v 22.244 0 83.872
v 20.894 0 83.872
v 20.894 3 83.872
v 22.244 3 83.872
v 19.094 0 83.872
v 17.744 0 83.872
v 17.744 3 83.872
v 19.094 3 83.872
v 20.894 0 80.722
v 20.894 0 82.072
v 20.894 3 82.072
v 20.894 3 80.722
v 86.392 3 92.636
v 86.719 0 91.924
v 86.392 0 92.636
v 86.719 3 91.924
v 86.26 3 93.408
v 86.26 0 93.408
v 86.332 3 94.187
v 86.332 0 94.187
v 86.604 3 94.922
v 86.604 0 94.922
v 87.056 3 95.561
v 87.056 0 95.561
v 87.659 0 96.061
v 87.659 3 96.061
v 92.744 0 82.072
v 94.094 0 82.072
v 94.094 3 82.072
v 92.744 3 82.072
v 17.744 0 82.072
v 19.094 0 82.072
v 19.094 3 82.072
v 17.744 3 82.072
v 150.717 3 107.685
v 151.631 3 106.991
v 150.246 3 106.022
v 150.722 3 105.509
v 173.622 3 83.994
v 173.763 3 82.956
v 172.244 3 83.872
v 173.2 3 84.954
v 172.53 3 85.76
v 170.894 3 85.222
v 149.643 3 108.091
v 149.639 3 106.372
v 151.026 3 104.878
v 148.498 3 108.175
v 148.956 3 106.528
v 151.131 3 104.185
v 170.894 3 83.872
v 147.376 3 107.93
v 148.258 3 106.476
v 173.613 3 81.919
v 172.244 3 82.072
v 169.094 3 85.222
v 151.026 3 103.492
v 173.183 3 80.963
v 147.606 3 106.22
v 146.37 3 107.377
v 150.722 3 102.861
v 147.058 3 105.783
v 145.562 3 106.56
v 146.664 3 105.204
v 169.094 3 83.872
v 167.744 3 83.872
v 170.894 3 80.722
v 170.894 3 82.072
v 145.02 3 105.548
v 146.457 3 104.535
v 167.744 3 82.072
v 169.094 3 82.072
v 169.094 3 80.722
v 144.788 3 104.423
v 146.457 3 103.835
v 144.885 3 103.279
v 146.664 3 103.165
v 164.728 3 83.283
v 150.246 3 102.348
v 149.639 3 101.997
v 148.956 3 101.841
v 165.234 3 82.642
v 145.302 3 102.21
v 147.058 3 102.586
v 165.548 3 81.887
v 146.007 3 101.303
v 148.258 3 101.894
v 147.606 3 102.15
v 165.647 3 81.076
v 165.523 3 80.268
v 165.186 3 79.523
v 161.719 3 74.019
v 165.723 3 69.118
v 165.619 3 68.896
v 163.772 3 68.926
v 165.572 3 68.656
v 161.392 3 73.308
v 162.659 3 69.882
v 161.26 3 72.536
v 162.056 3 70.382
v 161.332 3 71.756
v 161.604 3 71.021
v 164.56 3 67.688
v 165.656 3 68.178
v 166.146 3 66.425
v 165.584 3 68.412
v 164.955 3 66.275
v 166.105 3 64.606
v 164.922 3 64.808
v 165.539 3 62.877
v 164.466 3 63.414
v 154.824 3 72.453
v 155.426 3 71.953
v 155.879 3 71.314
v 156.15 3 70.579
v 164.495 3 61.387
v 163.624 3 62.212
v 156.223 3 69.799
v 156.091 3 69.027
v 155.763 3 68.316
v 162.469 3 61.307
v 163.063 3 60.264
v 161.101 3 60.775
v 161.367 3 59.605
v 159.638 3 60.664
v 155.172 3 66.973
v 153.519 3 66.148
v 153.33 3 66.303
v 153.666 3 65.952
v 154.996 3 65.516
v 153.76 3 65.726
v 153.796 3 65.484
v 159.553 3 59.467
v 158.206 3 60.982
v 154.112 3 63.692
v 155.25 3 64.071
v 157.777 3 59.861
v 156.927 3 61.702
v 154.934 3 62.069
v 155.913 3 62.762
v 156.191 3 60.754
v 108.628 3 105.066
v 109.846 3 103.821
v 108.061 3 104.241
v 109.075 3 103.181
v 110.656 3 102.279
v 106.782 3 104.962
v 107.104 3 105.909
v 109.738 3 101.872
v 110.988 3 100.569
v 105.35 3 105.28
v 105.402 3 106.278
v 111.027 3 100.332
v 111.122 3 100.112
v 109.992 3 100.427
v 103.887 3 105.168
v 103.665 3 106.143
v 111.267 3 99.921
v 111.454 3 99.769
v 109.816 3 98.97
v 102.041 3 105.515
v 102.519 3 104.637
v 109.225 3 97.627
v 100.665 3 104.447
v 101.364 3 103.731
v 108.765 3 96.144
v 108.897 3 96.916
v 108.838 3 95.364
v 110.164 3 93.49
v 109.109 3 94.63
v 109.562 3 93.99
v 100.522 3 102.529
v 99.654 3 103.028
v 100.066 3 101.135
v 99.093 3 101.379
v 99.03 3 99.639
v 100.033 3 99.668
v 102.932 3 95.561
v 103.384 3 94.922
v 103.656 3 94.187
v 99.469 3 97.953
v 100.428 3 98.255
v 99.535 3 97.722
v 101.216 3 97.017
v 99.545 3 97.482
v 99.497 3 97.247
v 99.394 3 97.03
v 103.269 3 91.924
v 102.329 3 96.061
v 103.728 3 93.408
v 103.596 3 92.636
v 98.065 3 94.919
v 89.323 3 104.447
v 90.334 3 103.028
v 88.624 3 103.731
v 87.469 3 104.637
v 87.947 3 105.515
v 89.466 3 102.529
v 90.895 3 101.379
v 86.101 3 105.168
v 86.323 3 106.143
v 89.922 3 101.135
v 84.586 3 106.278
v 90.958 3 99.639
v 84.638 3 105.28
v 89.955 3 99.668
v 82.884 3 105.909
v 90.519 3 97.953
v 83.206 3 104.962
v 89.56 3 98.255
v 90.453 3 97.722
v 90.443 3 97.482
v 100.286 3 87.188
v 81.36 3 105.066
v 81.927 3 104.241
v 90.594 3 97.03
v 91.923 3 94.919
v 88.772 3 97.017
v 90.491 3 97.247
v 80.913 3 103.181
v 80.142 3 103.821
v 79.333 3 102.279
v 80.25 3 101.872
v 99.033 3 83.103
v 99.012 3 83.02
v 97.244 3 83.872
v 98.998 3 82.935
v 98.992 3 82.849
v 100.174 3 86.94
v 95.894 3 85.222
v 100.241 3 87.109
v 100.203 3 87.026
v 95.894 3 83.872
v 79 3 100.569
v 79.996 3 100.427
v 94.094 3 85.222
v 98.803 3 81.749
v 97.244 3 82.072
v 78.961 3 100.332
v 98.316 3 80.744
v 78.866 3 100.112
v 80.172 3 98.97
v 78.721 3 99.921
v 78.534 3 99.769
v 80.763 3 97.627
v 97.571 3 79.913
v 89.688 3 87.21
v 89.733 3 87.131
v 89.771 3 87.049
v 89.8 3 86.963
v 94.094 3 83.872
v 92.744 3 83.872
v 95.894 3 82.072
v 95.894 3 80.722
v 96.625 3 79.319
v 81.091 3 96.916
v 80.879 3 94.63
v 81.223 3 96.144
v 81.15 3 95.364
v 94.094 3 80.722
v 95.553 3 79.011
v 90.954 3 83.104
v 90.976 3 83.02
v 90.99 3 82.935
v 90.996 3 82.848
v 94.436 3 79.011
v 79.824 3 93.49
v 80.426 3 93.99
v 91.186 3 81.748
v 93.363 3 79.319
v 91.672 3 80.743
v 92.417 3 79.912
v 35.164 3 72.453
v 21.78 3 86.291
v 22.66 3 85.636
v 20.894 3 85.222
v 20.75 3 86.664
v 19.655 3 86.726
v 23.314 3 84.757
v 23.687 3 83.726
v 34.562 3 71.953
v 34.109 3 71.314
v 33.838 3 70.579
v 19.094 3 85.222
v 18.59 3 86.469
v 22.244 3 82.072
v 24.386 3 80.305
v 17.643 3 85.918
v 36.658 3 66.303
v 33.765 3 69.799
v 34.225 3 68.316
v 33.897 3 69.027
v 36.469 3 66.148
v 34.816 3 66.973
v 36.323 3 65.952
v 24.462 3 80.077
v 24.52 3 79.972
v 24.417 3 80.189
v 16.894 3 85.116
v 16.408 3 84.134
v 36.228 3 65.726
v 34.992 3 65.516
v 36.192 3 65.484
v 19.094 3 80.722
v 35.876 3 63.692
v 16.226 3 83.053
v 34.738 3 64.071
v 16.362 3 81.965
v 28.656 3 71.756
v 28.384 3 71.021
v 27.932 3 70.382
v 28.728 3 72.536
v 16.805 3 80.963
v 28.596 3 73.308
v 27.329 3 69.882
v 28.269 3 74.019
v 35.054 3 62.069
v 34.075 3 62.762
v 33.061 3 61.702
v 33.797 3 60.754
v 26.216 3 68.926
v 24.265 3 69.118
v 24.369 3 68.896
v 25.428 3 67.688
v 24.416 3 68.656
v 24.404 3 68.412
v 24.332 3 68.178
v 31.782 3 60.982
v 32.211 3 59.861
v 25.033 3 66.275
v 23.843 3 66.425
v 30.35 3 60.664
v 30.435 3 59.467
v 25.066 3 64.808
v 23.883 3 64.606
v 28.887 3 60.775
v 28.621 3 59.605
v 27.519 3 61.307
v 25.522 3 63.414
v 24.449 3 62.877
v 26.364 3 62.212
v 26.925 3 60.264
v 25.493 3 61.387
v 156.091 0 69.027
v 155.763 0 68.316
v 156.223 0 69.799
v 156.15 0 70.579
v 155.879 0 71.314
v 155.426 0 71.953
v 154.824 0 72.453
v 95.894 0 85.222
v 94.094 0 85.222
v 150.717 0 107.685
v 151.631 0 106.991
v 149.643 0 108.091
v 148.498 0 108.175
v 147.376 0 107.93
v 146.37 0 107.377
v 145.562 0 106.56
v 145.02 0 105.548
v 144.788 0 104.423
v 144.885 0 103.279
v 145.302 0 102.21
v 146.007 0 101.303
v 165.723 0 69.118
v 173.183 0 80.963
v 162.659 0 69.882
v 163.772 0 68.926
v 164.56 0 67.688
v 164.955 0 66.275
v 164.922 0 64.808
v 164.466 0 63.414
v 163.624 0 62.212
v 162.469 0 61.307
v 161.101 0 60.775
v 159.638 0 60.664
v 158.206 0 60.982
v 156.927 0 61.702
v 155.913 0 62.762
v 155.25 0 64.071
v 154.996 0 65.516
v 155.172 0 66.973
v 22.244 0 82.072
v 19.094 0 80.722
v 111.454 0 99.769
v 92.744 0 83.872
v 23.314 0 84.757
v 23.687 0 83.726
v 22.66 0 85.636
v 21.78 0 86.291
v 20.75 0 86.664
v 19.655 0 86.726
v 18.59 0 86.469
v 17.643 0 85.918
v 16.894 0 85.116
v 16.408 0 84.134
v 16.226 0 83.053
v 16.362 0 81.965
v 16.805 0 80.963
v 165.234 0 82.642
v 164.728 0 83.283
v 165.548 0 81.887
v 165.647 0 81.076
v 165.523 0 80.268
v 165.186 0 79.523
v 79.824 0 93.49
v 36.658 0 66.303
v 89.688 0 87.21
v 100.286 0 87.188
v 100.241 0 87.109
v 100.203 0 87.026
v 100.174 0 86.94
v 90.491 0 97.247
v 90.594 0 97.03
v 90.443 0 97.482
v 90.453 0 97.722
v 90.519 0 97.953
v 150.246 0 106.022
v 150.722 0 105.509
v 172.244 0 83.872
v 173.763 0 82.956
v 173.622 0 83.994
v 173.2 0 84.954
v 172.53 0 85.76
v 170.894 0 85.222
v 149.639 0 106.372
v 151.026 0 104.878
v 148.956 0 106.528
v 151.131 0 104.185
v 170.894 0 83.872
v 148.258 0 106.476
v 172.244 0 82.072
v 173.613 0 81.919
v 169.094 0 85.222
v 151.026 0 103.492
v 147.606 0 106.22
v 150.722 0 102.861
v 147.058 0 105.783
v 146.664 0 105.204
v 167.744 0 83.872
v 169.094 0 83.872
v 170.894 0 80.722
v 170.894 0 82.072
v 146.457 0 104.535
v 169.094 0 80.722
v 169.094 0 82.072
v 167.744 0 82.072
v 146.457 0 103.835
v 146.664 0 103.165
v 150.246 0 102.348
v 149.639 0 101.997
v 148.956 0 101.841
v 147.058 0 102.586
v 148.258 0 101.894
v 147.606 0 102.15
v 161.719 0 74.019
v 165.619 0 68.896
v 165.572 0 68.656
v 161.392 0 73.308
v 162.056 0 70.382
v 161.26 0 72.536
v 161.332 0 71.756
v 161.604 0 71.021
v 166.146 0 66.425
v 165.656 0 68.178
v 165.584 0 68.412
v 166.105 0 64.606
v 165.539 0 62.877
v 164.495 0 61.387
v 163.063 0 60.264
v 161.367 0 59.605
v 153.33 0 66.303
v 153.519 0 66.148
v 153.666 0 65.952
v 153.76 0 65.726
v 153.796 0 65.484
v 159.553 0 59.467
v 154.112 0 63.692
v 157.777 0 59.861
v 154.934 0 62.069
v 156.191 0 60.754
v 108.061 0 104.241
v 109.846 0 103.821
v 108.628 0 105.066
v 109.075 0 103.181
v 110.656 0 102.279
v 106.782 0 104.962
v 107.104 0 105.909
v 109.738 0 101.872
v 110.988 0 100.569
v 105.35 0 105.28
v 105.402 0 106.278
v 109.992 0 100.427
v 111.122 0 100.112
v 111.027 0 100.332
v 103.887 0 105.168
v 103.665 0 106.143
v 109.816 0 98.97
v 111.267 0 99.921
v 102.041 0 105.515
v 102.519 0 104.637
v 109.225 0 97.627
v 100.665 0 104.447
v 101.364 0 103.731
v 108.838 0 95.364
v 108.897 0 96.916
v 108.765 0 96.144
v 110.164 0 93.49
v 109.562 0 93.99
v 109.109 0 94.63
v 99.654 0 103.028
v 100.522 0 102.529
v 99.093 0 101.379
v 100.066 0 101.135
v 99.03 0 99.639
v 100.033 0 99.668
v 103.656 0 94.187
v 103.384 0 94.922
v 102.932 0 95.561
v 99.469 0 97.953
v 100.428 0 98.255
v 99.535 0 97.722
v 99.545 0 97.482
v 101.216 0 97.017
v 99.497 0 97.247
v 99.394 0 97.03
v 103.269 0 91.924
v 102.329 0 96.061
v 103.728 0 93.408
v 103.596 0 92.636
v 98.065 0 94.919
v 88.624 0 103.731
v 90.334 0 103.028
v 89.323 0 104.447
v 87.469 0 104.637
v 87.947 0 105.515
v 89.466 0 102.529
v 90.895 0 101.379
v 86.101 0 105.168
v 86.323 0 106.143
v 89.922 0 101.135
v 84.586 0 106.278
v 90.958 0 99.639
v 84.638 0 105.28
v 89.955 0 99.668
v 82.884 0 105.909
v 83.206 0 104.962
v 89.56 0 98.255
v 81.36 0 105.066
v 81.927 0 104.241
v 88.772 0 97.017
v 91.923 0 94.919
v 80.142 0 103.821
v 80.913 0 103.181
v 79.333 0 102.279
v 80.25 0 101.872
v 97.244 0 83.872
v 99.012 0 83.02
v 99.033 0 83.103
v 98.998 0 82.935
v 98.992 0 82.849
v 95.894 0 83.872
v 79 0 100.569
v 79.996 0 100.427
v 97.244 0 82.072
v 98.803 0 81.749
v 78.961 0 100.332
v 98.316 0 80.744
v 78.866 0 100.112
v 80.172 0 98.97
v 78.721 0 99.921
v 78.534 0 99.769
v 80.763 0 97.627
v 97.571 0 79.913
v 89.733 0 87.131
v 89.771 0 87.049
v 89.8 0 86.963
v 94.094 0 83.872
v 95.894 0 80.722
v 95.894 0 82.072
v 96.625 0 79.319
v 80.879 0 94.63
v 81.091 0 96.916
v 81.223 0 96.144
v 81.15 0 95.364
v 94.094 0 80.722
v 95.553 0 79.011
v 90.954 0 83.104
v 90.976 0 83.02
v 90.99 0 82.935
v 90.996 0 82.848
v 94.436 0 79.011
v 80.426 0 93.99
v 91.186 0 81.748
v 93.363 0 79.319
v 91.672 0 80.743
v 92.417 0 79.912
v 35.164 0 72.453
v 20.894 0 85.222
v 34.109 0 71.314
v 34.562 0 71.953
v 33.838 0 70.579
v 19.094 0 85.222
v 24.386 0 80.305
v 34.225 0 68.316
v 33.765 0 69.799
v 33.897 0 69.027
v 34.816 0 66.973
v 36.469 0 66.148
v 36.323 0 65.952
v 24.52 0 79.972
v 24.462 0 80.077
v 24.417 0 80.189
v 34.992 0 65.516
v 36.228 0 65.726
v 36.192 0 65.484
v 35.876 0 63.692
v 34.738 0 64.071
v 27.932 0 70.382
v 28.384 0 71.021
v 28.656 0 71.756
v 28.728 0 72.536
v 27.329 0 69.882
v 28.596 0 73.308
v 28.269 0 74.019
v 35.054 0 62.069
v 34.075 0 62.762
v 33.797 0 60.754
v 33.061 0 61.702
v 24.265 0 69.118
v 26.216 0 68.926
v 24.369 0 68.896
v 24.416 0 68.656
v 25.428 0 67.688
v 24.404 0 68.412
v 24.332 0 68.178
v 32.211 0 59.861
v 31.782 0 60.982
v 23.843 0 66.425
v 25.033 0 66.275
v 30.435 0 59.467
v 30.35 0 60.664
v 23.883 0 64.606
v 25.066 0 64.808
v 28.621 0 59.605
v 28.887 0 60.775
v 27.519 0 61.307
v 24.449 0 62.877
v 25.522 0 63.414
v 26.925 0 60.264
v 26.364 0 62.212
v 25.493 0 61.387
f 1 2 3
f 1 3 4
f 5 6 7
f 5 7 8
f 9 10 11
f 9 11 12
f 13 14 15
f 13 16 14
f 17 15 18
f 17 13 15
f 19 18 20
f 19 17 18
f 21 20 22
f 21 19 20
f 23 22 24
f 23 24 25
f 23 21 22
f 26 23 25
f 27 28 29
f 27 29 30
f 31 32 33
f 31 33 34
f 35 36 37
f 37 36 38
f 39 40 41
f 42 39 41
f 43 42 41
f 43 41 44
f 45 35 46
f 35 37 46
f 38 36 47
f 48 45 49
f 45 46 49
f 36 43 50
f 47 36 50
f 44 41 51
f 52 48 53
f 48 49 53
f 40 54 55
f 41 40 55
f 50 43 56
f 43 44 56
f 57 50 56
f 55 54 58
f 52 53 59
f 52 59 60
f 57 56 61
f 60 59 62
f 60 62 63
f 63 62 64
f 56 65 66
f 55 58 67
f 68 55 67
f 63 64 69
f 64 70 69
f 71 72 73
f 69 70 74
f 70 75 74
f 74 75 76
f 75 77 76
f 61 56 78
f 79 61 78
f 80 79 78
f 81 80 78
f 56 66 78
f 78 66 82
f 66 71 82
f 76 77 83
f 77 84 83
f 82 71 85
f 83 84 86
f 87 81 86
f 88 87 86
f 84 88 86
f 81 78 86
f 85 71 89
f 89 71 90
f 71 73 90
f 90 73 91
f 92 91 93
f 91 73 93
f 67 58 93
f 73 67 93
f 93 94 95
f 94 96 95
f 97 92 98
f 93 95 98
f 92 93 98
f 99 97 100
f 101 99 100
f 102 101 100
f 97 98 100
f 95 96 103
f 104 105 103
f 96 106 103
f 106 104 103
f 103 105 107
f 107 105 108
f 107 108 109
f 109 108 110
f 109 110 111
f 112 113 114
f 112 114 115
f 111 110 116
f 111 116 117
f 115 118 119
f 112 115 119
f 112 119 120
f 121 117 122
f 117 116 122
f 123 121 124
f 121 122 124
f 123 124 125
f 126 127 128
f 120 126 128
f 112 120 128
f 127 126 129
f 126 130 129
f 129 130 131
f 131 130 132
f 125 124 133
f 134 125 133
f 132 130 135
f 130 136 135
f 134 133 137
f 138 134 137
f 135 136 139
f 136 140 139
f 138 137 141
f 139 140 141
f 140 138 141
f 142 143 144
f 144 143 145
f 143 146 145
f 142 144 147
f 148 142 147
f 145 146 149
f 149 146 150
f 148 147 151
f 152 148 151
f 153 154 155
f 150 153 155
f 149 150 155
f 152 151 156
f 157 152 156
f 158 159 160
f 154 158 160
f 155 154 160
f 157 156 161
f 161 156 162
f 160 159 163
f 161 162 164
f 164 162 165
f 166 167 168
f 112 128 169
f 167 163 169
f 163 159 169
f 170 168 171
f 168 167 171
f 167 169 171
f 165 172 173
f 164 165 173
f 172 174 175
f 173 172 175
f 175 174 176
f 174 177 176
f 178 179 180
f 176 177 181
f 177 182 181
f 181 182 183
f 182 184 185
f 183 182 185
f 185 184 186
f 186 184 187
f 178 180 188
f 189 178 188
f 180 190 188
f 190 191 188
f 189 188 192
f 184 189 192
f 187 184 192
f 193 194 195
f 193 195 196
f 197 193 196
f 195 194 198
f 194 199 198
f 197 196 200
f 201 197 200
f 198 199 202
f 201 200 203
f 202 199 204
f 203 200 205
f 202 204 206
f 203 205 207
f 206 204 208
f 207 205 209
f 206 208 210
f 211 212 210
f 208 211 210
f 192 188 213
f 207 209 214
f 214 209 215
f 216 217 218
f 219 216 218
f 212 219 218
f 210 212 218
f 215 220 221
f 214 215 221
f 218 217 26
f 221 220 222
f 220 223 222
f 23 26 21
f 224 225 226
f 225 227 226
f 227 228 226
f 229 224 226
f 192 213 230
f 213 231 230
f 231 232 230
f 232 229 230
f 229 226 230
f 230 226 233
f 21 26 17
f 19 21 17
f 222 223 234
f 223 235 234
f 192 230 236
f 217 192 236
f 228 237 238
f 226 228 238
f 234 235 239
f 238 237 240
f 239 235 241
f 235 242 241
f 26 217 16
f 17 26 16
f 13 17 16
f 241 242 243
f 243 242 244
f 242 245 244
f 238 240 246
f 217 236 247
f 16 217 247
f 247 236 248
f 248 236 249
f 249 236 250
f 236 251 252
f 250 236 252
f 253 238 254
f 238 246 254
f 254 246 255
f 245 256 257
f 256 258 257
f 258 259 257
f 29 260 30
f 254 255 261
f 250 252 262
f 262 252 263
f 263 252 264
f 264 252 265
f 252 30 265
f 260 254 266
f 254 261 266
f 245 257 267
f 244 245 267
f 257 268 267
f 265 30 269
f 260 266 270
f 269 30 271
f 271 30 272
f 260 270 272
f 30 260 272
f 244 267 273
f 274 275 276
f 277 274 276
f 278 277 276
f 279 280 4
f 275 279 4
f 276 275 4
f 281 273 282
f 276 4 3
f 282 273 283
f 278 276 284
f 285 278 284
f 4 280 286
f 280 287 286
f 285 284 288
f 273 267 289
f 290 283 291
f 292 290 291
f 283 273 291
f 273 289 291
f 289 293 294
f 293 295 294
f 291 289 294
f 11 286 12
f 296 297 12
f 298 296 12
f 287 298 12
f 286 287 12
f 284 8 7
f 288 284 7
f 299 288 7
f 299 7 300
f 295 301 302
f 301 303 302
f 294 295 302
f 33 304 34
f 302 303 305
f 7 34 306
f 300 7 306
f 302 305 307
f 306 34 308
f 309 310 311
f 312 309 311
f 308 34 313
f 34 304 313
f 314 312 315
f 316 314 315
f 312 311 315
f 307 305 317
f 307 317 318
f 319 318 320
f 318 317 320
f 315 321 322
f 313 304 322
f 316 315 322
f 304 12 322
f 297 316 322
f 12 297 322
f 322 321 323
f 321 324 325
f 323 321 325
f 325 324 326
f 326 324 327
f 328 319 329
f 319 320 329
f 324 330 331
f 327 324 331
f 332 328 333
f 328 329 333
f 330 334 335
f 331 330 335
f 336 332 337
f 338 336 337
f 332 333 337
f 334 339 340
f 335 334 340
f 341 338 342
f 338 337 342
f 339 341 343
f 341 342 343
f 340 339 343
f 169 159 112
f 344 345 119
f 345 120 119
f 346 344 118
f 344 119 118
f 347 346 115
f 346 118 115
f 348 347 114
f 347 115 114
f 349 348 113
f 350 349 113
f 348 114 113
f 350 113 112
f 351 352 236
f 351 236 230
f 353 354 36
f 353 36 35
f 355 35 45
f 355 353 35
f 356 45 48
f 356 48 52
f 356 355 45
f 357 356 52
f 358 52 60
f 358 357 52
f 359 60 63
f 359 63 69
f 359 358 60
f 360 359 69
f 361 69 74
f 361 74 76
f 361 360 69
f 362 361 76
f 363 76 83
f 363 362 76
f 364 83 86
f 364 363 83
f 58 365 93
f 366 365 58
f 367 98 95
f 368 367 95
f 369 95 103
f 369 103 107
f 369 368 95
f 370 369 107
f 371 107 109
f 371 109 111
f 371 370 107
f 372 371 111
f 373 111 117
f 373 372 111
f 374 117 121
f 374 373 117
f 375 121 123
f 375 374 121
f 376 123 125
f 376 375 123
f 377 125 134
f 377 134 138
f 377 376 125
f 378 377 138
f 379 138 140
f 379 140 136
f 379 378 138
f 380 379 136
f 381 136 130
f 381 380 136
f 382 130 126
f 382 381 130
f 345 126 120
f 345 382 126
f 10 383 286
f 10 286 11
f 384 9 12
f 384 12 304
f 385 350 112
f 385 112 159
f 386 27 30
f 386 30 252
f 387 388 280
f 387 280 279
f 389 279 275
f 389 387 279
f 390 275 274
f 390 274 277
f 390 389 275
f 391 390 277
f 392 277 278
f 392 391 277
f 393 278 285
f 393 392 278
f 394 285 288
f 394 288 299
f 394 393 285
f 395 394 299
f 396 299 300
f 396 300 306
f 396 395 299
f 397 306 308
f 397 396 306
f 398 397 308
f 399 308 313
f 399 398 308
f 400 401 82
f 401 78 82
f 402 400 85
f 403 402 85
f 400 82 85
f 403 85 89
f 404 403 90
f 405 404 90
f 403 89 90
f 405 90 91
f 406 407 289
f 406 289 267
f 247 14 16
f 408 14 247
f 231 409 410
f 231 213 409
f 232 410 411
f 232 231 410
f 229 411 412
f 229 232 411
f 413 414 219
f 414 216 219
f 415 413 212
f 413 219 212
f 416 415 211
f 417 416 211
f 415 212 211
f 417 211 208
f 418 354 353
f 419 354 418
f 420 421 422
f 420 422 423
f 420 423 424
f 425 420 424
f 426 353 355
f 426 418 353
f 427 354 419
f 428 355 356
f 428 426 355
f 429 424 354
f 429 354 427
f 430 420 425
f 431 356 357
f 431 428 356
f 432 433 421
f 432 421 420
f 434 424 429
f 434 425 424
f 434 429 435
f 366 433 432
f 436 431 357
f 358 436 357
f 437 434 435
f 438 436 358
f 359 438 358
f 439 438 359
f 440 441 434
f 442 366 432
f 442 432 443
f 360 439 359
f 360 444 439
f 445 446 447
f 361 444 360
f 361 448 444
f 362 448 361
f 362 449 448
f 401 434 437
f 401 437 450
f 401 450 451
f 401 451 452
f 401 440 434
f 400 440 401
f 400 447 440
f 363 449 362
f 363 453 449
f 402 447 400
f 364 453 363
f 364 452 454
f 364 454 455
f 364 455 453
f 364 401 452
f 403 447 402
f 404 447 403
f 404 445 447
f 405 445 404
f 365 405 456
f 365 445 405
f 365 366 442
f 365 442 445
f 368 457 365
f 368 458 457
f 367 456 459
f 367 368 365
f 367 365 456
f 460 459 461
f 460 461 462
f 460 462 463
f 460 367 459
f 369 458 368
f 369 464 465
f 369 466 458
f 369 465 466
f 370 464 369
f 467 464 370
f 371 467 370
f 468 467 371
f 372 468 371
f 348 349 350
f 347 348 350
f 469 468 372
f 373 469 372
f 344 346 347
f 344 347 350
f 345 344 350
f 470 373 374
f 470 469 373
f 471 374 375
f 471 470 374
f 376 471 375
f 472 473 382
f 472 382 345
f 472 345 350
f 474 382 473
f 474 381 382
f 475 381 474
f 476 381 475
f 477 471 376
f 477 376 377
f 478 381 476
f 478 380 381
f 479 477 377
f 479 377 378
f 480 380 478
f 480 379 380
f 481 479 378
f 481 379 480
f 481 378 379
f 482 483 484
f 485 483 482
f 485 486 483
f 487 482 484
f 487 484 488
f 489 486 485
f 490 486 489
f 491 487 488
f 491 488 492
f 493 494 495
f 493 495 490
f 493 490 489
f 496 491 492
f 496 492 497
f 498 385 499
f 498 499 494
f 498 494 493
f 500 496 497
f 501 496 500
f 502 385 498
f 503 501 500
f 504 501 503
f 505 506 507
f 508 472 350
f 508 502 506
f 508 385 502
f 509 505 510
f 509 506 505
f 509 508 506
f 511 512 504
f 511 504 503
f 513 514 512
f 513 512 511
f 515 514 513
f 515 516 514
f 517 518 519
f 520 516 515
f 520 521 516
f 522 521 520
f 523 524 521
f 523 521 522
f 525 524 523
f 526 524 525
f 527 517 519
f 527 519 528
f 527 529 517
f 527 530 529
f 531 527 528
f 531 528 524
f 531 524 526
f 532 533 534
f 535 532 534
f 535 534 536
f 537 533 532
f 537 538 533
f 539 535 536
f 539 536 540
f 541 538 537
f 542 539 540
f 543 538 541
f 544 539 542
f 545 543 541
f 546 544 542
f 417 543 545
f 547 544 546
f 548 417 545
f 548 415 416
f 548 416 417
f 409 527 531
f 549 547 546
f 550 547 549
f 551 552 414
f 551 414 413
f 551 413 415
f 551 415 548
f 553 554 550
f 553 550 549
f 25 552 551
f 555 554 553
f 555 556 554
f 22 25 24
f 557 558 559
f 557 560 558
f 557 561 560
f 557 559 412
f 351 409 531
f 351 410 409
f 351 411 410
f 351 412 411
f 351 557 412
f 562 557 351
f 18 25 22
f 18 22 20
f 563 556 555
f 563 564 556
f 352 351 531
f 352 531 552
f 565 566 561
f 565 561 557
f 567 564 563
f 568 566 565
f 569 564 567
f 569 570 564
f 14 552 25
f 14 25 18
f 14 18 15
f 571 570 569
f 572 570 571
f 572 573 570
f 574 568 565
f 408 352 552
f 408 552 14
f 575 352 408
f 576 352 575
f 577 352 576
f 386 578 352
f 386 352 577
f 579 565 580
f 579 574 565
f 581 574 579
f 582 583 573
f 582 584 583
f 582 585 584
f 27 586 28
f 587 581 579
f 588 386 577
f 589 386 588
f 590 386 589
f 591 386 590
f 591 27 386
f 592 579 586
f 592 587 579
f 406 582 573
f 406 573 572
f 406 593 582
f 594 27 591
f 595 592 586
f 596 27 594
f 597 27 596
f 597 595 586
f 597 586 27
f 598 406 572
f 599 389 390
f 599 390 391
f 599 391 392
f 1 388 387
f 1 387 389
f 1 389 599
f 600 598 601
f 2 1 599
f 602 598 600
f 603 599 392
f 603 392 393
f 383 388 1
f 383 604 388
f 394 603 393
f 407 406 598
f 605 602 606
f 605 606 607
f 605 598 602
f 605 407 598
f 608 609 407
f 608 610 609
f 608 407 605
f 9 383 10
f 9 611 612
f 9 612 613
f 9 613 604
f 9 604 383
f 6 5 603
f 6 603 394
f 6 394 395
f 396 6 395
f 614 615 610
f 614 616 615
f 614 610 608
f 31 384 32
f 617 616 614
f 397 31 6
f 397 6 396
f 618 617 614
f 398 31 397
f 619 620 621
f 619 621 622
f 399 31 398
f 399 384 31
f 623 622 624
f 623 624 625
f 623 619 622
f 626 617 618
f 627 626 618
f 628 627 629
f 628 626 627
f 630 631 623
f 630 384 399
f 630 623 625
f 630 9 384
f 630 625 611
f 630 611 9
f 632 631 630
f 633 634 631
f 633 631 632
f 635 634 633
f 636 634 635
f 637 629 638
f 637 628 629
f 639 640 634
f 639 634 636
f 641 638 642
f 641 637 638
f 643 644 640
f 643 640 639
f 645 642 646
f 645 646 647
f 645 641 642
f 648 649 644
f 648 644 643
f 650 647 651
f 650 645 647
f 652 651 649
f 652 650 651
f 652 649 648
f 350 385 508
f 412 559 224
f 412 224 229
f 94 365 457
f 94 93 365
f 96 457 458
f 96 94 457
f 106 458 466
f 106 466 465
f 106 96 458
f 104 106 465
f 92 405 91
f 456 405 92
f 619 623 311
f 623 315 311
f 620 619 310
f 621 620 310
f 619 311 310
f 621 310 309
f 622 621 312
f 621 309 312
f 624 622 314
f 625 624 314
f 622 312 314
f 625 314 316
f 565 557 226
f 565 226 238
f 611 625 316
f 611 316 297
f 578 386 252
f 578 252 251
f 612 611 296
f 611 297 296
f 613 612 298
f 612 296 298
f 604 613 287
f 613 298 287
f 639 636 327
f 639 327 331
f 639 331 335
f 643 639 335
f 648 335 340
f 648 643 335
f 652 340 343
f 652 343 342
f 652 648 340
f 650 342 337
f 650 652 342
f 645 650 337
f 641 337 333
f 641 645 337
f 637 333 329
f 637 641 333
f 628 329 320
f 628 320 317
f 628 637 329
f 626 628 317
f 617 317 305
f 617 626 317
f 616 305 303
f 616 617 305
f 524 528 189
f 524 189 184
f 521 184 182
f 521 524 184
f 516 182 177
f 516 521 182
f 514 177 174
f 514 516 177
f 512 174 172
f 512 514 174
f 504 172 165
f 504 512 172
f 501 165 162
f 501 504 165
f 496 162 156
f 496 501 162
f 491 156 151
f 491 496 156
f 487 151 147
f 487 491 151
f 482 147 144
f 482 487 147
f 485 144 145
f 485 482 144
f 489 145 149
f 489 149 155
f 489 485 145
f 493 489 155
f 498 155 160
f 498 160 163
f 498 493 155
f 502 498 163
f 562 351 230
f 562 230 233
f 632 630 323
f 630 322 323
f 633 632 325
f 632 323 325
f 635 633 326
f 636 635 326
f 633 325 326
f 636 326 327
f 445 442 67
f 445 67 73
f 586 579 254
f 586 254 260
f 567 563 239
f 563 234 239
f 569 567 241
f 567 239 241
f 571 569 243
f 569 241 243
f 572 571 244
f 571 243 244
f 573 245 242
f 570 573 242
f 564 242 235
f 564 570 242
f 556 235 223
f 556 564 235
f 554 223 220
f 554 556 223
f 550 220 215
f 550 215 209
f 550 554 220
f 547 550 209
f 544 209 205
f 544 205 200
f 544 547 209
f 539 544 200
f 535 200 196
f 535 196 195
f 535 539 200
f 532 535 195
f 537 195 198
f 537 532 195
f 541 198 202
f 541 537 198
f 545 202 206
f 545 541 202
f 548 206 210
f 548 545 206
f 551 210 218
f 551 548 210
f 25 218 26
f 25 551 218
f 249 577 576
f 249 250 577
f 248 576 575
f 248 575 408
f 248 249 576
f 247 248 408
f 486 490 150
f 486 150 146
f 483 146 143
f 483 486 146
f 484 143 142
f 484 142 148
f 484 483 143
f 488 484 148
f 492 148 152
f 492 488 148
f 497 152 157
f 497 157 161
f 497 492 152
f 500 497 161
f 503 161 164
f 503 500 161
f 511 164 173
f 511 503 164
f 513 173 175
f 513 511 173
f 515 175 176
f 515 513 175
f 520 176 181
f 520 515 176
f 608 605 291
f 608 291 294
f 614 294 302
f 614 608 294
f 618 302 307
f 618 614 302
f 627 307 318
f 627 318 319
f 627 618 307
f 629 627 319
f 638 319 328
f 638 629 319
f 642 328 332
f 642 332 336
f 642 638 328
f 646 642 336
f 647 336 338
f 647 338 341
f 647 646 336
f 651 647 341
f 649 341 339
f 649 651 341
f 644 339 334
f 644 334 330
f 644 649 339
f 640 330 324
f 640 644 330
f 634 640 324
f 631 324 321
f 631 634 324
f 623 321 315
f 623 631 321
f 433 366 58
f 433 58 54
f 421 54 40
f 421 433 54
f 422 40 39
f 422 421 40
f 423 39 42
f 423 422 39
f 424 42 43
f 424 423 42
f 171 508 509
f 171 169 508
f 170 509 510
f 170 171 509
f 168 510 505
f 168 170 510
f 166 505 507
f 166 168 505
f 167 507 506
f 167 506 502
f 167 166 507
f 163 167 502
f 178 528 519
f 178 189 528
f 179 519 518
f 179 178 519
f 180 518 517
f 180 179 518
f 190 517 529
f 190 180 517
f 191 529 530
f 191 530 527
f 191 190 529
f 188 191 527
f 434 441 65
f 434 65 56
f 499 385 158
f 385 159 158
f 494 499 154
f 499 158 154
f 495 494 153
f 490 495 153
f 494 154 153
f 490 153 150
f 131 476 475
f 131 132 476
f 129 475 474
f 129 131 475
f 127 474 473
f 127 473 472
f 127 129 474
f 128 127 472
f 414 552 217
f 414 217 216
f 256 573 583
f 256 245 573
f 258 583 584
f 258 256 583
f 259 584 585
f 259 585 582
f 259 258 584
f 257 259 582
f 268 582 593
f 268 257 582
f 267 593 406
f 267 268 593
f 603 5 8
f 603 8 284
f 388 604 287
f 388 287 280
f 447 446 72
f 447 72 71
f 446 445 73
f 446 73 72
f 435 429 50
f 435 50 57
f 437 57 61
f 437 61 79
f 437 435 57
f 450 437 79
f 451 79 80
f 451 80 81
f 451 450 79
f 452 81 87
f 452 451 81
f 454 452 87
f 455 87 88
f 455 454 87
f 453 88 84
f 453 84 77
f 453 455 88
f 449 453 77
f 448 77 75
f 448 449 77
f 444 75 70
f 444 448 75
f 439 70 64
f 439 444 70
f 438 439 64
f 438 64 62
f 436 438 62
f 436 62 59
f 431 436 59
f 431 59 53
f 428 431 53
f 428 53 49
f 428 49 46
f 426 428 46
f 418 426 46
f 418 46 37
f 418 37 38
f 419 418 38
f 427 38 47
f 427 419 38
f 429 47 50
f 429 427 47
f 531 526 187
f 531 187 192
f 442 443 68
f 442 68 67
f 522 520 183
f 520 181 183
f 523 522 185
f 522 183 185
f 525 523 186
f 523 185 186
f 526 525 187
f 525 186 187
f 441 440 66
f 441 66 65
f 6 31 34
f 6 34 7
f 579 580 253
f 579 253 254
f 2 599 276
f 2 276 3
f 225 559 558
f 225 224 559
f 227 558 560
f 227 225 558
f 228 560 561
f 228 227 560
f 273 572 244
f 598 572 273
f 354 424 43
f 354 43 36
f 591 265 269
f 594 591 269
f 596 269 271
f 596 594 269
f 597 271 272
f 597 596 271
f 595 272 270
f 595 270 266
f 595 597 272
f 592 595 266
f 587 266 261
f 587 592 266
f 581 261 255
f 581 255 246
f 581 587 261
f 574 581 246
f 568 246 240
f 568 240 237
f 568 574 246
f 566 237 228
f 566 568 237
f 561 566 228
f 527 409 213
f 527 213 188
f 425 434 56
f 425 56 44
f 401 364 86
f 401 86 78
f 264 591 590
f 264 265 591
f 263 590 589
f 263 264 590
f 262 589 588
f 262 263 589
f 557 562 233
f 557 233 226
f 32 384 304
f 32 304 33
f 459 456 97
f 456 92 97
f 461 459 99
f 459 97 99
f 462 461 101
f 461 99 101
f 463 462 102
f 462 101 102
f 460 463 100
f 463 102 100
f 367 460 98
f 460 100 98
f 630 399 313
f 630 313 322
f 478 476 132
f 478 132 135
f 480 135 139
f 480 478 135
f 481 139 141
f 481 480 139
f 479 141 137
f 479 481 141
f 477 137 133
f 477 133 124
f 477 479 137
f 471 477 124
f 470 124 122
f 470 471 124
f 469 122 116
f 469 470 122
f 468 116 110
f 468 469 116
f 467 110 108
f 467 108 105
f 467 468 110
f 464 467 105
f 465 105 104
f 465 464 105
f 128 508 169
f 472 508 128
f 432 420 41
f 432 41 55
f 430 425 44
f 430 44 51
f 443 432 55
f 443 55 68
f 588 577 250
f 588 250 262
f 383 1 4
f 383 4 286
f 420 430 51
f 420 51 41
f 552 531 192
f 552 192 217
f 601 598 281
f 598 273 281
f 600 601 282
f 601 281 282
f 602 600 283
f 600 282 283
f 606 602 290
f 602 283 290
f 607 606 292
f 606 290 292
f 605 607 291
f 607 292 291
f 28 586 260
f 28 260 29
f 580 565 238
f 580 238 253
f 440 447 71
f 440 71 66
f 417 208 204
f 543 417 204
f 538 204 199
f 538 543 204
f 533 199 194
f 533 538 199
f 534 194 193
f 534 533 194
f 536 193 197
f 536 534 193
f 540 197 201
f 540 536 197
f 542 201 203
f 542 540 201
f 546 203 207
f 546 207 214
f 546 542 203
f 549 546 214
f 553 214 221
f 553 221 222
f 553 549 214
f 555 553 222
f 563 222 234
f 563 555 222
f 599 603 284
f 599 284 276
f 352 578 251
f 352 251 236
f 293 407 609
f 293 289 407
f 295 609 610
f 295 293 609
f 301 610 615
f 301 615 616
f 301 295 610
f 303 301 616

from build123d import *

# Parameters (mm, degrees)
SKETCH1_R           = 2.35
BOSS_EXTRUDE1_DEPTH = 3
FILLET1_R           = 3
FILLET2_R           = 1


with BuildPart() as part:
    # Sketch1 → Boss-Extrude1 (new body)
    with BuildSketch(Plane(origin=(0, 0, 0), x_dir=(1, 0, 0), z_dir=(0, 1, 0))):
        with BuildLine():
            Line((172.530209002, -85.760018057), (151.631467282, -106.990912204))
            ThreePointArc((151.631467282, -106.990912204), (145.936608589, -106.997416648), (146.006888843, -101.302987922))
            Line((146.006888843, -101.302987922), (166.487269252, -81.589717624))
            Line((166.487269252, -81.589717624), (159.587325171, -70.634585049))
            ThreePointArc((159.587325171, -70.634585049), (161.101414603, -60.775325043), (158.208232615, -70.321369913))
            Line((158.208232615, -70.321369913), (110.989592357, -100.061400455))
            ThreePointArc((110.989592357, -100.061400455), (103.665172589, -106.143163876), (99.686339562, -97.494241459))
            Line((99.686339562, -97.494241459), (98.064605927, -94.919393494))
            Line((98.064605927, -94.919393494), (91.923450353, -94.919393494))
            Line((91.923450353, -94.919393494), (90.301716718, -97.494241459))
            ThreePointArc((90.301716718, -97.494241459), (86.322883691, -106.143163876), (78.998463923, -100.061400455))
            Line((78.998463923, -100.061400455), (31.779823665, -70.321369913))
            ThreePointArc((31.779823665, -70.321369913), (28.886641677, -60.775325043), (30.400731109, -70.634585049))
            Line((30.400731109, -70.634585049), (24.422488643, -80.126319765))
            Line((24.422488643, -80.126319765), (23.686968876, -83.726197894))
            ThreePointArc((23.686968876, -83.726197894), (18.589619222, -86.469487176), (16.804675386, -80.962892486))
            Line((16.804675386, -80.962892486), (24.563909918, -68.643453086))
            ThreePointArc((24.563909918, -68.643453086), (28.620869821, -59.605126205), (36.183956221, -66.00434495))
            Line((36.183956221, -66.00434495), (83.208225156, -95.621953308))
            ThreePointArc((83.208225156, -95.621953308), (86.101407144, -105.167998178), (84.587317712, -95.308738171))
            Line((84.587317712, -95.308738171), (89.761234685, -87.094041689))
            Line((89.761234685, -87.094041689), (90.99402814, -82.971663764))
            ThreePointArc((90.99402814, -82.971663764), (94.99402814, -78.971663764), (98.99402814, -82.971663764))
            Line((98.99402814, -82.971663764), (100.212762732, -87.071720247))
            Line((100.212762732, -87.071720247), (105.400738568, -95.308738171))
            ThreePointArc((105.400738568, -95.308738171), (103.886649136, -105.167998178), (106.779831124, -95.621953308))
            Line((106.779831124, -95.621953308), (153.804100058, -66.00434495))
            ThreePointArc((153.804100058, -66.00434495), (161.367186459, -59.605126205), (165.424146361, -68.643453086))
            Line((165.424146361, -68.643453086), (173.183380893, -80.962892486))
            ThreePointArc((173.183380893, -80.962892486), (173.728802193, -83.480186919), (172.530209002, -85.760018057))
        make_face()
        with Locations((148.780829272, -104.184871767)):
            Circle(SKETCH1_R, mode=Mode.SUBTRACT)
        Polygon((167.74402814, -82.071663764), (167.74402814, -83.871663764), (169.09402814, -83.871663764), (169.09402814, -85.221663764), (170.89402814, -85.221663764), (170.89402814, -83.871663764), (172.24402814, -83.871663764), (172.24402814, -82.071663764), (170.89402814, -82.071663764), (170.89402814, -80.721663764), (169.09402814, -80.721663764), (169.09402814, -82.071663764), align=None, mode=Mode.SUBTRACT)
        Polygon((92.74402814, -82.071663764), (92.74402814, -83.871663764), (94.09402814, -83.871663764), (94.09402814, -85.221663764), (95.89402814, -85.221663764), (95.89402814, -83.871663764), (97.24402814, -83.871663764), (97.24402814, -82.071663764), (95.89402814, -82.071663764), (95.89402814, -80.721663764), (94.09402814, -80.721663764), (94.09402814, -82.071663764), align=None, mode=Mode.SUBTRACT)
        Polygon((17.74402814, -82.071663764), (17.74402814, -83.871663764), (19.09402814, -83.871663764), (19.09402814, -85.221663764), (20.89402814, -85.221663764), (20.89402814, -83.871663764), (22.24402814, -83.871663764), (22.24402814, -82.071663764), (20.89402814, -82.071663764), (20.89402814, -80.721663764), (19.09402814, -80.721663764), (19.09402814, -82.071663764), align=None, mode=Mode.SUBTRACT)
    extrude(amount=BOSS_EXTRUDE1_DEPTH)

    # Fillet1
    fillet1_edges = [part.edges().sort_by_distance(p)[0] for p in [
        (166.487269252, 1.5, 81.589717624),
        (159.587325171, 1.5, 70.634585049),
        (158.208232615, 1.5, 70.321369913),
        (31.779823665, 1.5, 70.321369913),
        (30.400731109, 1.5, 70.634585049),
        (83.208225156, 1.5, 95.621953308),
        (84.587317712, 1.5, 95.308738171),
        (105.400738568, 1.5, 95.308738171),
        (106.779831124, 1.5, 95.621953308),
    ]]
    fillet(fillet1_edges, radius=FILLET1_R)

    # Fillet2
    fillet2_edges = [part.edges().sort_by_distance(p)[0] for p in [
        (110.989592357, 1.5, 100.061400455),
        (99.686339562, 1.5, 97.494241459),
        (90.301716718, 1.5, 97.494241459),
        (78.998463923, 1.5, 100.061400455),
        (24.422488643, 1.5, 80.126319765),
        (24.563909918, 1.5, 68.643453086),
        (36.183956221, 1.5, 66.00434495),
        (89.761234685, 1.5, 87.094041689),
        (90.99402814, 1.5, 82.971663764),
        (98.99402814, 1.5, 82.971663764),
        (100.212762732, 1.5, 87.071720247),
        (153.804100058, 1.5, 66.00434495),
        (165.424146361, 1.5, 68.643453086),
    ]]
    fillet(fillet2_edges, radius=FILLET2_R)


solid = part.part
